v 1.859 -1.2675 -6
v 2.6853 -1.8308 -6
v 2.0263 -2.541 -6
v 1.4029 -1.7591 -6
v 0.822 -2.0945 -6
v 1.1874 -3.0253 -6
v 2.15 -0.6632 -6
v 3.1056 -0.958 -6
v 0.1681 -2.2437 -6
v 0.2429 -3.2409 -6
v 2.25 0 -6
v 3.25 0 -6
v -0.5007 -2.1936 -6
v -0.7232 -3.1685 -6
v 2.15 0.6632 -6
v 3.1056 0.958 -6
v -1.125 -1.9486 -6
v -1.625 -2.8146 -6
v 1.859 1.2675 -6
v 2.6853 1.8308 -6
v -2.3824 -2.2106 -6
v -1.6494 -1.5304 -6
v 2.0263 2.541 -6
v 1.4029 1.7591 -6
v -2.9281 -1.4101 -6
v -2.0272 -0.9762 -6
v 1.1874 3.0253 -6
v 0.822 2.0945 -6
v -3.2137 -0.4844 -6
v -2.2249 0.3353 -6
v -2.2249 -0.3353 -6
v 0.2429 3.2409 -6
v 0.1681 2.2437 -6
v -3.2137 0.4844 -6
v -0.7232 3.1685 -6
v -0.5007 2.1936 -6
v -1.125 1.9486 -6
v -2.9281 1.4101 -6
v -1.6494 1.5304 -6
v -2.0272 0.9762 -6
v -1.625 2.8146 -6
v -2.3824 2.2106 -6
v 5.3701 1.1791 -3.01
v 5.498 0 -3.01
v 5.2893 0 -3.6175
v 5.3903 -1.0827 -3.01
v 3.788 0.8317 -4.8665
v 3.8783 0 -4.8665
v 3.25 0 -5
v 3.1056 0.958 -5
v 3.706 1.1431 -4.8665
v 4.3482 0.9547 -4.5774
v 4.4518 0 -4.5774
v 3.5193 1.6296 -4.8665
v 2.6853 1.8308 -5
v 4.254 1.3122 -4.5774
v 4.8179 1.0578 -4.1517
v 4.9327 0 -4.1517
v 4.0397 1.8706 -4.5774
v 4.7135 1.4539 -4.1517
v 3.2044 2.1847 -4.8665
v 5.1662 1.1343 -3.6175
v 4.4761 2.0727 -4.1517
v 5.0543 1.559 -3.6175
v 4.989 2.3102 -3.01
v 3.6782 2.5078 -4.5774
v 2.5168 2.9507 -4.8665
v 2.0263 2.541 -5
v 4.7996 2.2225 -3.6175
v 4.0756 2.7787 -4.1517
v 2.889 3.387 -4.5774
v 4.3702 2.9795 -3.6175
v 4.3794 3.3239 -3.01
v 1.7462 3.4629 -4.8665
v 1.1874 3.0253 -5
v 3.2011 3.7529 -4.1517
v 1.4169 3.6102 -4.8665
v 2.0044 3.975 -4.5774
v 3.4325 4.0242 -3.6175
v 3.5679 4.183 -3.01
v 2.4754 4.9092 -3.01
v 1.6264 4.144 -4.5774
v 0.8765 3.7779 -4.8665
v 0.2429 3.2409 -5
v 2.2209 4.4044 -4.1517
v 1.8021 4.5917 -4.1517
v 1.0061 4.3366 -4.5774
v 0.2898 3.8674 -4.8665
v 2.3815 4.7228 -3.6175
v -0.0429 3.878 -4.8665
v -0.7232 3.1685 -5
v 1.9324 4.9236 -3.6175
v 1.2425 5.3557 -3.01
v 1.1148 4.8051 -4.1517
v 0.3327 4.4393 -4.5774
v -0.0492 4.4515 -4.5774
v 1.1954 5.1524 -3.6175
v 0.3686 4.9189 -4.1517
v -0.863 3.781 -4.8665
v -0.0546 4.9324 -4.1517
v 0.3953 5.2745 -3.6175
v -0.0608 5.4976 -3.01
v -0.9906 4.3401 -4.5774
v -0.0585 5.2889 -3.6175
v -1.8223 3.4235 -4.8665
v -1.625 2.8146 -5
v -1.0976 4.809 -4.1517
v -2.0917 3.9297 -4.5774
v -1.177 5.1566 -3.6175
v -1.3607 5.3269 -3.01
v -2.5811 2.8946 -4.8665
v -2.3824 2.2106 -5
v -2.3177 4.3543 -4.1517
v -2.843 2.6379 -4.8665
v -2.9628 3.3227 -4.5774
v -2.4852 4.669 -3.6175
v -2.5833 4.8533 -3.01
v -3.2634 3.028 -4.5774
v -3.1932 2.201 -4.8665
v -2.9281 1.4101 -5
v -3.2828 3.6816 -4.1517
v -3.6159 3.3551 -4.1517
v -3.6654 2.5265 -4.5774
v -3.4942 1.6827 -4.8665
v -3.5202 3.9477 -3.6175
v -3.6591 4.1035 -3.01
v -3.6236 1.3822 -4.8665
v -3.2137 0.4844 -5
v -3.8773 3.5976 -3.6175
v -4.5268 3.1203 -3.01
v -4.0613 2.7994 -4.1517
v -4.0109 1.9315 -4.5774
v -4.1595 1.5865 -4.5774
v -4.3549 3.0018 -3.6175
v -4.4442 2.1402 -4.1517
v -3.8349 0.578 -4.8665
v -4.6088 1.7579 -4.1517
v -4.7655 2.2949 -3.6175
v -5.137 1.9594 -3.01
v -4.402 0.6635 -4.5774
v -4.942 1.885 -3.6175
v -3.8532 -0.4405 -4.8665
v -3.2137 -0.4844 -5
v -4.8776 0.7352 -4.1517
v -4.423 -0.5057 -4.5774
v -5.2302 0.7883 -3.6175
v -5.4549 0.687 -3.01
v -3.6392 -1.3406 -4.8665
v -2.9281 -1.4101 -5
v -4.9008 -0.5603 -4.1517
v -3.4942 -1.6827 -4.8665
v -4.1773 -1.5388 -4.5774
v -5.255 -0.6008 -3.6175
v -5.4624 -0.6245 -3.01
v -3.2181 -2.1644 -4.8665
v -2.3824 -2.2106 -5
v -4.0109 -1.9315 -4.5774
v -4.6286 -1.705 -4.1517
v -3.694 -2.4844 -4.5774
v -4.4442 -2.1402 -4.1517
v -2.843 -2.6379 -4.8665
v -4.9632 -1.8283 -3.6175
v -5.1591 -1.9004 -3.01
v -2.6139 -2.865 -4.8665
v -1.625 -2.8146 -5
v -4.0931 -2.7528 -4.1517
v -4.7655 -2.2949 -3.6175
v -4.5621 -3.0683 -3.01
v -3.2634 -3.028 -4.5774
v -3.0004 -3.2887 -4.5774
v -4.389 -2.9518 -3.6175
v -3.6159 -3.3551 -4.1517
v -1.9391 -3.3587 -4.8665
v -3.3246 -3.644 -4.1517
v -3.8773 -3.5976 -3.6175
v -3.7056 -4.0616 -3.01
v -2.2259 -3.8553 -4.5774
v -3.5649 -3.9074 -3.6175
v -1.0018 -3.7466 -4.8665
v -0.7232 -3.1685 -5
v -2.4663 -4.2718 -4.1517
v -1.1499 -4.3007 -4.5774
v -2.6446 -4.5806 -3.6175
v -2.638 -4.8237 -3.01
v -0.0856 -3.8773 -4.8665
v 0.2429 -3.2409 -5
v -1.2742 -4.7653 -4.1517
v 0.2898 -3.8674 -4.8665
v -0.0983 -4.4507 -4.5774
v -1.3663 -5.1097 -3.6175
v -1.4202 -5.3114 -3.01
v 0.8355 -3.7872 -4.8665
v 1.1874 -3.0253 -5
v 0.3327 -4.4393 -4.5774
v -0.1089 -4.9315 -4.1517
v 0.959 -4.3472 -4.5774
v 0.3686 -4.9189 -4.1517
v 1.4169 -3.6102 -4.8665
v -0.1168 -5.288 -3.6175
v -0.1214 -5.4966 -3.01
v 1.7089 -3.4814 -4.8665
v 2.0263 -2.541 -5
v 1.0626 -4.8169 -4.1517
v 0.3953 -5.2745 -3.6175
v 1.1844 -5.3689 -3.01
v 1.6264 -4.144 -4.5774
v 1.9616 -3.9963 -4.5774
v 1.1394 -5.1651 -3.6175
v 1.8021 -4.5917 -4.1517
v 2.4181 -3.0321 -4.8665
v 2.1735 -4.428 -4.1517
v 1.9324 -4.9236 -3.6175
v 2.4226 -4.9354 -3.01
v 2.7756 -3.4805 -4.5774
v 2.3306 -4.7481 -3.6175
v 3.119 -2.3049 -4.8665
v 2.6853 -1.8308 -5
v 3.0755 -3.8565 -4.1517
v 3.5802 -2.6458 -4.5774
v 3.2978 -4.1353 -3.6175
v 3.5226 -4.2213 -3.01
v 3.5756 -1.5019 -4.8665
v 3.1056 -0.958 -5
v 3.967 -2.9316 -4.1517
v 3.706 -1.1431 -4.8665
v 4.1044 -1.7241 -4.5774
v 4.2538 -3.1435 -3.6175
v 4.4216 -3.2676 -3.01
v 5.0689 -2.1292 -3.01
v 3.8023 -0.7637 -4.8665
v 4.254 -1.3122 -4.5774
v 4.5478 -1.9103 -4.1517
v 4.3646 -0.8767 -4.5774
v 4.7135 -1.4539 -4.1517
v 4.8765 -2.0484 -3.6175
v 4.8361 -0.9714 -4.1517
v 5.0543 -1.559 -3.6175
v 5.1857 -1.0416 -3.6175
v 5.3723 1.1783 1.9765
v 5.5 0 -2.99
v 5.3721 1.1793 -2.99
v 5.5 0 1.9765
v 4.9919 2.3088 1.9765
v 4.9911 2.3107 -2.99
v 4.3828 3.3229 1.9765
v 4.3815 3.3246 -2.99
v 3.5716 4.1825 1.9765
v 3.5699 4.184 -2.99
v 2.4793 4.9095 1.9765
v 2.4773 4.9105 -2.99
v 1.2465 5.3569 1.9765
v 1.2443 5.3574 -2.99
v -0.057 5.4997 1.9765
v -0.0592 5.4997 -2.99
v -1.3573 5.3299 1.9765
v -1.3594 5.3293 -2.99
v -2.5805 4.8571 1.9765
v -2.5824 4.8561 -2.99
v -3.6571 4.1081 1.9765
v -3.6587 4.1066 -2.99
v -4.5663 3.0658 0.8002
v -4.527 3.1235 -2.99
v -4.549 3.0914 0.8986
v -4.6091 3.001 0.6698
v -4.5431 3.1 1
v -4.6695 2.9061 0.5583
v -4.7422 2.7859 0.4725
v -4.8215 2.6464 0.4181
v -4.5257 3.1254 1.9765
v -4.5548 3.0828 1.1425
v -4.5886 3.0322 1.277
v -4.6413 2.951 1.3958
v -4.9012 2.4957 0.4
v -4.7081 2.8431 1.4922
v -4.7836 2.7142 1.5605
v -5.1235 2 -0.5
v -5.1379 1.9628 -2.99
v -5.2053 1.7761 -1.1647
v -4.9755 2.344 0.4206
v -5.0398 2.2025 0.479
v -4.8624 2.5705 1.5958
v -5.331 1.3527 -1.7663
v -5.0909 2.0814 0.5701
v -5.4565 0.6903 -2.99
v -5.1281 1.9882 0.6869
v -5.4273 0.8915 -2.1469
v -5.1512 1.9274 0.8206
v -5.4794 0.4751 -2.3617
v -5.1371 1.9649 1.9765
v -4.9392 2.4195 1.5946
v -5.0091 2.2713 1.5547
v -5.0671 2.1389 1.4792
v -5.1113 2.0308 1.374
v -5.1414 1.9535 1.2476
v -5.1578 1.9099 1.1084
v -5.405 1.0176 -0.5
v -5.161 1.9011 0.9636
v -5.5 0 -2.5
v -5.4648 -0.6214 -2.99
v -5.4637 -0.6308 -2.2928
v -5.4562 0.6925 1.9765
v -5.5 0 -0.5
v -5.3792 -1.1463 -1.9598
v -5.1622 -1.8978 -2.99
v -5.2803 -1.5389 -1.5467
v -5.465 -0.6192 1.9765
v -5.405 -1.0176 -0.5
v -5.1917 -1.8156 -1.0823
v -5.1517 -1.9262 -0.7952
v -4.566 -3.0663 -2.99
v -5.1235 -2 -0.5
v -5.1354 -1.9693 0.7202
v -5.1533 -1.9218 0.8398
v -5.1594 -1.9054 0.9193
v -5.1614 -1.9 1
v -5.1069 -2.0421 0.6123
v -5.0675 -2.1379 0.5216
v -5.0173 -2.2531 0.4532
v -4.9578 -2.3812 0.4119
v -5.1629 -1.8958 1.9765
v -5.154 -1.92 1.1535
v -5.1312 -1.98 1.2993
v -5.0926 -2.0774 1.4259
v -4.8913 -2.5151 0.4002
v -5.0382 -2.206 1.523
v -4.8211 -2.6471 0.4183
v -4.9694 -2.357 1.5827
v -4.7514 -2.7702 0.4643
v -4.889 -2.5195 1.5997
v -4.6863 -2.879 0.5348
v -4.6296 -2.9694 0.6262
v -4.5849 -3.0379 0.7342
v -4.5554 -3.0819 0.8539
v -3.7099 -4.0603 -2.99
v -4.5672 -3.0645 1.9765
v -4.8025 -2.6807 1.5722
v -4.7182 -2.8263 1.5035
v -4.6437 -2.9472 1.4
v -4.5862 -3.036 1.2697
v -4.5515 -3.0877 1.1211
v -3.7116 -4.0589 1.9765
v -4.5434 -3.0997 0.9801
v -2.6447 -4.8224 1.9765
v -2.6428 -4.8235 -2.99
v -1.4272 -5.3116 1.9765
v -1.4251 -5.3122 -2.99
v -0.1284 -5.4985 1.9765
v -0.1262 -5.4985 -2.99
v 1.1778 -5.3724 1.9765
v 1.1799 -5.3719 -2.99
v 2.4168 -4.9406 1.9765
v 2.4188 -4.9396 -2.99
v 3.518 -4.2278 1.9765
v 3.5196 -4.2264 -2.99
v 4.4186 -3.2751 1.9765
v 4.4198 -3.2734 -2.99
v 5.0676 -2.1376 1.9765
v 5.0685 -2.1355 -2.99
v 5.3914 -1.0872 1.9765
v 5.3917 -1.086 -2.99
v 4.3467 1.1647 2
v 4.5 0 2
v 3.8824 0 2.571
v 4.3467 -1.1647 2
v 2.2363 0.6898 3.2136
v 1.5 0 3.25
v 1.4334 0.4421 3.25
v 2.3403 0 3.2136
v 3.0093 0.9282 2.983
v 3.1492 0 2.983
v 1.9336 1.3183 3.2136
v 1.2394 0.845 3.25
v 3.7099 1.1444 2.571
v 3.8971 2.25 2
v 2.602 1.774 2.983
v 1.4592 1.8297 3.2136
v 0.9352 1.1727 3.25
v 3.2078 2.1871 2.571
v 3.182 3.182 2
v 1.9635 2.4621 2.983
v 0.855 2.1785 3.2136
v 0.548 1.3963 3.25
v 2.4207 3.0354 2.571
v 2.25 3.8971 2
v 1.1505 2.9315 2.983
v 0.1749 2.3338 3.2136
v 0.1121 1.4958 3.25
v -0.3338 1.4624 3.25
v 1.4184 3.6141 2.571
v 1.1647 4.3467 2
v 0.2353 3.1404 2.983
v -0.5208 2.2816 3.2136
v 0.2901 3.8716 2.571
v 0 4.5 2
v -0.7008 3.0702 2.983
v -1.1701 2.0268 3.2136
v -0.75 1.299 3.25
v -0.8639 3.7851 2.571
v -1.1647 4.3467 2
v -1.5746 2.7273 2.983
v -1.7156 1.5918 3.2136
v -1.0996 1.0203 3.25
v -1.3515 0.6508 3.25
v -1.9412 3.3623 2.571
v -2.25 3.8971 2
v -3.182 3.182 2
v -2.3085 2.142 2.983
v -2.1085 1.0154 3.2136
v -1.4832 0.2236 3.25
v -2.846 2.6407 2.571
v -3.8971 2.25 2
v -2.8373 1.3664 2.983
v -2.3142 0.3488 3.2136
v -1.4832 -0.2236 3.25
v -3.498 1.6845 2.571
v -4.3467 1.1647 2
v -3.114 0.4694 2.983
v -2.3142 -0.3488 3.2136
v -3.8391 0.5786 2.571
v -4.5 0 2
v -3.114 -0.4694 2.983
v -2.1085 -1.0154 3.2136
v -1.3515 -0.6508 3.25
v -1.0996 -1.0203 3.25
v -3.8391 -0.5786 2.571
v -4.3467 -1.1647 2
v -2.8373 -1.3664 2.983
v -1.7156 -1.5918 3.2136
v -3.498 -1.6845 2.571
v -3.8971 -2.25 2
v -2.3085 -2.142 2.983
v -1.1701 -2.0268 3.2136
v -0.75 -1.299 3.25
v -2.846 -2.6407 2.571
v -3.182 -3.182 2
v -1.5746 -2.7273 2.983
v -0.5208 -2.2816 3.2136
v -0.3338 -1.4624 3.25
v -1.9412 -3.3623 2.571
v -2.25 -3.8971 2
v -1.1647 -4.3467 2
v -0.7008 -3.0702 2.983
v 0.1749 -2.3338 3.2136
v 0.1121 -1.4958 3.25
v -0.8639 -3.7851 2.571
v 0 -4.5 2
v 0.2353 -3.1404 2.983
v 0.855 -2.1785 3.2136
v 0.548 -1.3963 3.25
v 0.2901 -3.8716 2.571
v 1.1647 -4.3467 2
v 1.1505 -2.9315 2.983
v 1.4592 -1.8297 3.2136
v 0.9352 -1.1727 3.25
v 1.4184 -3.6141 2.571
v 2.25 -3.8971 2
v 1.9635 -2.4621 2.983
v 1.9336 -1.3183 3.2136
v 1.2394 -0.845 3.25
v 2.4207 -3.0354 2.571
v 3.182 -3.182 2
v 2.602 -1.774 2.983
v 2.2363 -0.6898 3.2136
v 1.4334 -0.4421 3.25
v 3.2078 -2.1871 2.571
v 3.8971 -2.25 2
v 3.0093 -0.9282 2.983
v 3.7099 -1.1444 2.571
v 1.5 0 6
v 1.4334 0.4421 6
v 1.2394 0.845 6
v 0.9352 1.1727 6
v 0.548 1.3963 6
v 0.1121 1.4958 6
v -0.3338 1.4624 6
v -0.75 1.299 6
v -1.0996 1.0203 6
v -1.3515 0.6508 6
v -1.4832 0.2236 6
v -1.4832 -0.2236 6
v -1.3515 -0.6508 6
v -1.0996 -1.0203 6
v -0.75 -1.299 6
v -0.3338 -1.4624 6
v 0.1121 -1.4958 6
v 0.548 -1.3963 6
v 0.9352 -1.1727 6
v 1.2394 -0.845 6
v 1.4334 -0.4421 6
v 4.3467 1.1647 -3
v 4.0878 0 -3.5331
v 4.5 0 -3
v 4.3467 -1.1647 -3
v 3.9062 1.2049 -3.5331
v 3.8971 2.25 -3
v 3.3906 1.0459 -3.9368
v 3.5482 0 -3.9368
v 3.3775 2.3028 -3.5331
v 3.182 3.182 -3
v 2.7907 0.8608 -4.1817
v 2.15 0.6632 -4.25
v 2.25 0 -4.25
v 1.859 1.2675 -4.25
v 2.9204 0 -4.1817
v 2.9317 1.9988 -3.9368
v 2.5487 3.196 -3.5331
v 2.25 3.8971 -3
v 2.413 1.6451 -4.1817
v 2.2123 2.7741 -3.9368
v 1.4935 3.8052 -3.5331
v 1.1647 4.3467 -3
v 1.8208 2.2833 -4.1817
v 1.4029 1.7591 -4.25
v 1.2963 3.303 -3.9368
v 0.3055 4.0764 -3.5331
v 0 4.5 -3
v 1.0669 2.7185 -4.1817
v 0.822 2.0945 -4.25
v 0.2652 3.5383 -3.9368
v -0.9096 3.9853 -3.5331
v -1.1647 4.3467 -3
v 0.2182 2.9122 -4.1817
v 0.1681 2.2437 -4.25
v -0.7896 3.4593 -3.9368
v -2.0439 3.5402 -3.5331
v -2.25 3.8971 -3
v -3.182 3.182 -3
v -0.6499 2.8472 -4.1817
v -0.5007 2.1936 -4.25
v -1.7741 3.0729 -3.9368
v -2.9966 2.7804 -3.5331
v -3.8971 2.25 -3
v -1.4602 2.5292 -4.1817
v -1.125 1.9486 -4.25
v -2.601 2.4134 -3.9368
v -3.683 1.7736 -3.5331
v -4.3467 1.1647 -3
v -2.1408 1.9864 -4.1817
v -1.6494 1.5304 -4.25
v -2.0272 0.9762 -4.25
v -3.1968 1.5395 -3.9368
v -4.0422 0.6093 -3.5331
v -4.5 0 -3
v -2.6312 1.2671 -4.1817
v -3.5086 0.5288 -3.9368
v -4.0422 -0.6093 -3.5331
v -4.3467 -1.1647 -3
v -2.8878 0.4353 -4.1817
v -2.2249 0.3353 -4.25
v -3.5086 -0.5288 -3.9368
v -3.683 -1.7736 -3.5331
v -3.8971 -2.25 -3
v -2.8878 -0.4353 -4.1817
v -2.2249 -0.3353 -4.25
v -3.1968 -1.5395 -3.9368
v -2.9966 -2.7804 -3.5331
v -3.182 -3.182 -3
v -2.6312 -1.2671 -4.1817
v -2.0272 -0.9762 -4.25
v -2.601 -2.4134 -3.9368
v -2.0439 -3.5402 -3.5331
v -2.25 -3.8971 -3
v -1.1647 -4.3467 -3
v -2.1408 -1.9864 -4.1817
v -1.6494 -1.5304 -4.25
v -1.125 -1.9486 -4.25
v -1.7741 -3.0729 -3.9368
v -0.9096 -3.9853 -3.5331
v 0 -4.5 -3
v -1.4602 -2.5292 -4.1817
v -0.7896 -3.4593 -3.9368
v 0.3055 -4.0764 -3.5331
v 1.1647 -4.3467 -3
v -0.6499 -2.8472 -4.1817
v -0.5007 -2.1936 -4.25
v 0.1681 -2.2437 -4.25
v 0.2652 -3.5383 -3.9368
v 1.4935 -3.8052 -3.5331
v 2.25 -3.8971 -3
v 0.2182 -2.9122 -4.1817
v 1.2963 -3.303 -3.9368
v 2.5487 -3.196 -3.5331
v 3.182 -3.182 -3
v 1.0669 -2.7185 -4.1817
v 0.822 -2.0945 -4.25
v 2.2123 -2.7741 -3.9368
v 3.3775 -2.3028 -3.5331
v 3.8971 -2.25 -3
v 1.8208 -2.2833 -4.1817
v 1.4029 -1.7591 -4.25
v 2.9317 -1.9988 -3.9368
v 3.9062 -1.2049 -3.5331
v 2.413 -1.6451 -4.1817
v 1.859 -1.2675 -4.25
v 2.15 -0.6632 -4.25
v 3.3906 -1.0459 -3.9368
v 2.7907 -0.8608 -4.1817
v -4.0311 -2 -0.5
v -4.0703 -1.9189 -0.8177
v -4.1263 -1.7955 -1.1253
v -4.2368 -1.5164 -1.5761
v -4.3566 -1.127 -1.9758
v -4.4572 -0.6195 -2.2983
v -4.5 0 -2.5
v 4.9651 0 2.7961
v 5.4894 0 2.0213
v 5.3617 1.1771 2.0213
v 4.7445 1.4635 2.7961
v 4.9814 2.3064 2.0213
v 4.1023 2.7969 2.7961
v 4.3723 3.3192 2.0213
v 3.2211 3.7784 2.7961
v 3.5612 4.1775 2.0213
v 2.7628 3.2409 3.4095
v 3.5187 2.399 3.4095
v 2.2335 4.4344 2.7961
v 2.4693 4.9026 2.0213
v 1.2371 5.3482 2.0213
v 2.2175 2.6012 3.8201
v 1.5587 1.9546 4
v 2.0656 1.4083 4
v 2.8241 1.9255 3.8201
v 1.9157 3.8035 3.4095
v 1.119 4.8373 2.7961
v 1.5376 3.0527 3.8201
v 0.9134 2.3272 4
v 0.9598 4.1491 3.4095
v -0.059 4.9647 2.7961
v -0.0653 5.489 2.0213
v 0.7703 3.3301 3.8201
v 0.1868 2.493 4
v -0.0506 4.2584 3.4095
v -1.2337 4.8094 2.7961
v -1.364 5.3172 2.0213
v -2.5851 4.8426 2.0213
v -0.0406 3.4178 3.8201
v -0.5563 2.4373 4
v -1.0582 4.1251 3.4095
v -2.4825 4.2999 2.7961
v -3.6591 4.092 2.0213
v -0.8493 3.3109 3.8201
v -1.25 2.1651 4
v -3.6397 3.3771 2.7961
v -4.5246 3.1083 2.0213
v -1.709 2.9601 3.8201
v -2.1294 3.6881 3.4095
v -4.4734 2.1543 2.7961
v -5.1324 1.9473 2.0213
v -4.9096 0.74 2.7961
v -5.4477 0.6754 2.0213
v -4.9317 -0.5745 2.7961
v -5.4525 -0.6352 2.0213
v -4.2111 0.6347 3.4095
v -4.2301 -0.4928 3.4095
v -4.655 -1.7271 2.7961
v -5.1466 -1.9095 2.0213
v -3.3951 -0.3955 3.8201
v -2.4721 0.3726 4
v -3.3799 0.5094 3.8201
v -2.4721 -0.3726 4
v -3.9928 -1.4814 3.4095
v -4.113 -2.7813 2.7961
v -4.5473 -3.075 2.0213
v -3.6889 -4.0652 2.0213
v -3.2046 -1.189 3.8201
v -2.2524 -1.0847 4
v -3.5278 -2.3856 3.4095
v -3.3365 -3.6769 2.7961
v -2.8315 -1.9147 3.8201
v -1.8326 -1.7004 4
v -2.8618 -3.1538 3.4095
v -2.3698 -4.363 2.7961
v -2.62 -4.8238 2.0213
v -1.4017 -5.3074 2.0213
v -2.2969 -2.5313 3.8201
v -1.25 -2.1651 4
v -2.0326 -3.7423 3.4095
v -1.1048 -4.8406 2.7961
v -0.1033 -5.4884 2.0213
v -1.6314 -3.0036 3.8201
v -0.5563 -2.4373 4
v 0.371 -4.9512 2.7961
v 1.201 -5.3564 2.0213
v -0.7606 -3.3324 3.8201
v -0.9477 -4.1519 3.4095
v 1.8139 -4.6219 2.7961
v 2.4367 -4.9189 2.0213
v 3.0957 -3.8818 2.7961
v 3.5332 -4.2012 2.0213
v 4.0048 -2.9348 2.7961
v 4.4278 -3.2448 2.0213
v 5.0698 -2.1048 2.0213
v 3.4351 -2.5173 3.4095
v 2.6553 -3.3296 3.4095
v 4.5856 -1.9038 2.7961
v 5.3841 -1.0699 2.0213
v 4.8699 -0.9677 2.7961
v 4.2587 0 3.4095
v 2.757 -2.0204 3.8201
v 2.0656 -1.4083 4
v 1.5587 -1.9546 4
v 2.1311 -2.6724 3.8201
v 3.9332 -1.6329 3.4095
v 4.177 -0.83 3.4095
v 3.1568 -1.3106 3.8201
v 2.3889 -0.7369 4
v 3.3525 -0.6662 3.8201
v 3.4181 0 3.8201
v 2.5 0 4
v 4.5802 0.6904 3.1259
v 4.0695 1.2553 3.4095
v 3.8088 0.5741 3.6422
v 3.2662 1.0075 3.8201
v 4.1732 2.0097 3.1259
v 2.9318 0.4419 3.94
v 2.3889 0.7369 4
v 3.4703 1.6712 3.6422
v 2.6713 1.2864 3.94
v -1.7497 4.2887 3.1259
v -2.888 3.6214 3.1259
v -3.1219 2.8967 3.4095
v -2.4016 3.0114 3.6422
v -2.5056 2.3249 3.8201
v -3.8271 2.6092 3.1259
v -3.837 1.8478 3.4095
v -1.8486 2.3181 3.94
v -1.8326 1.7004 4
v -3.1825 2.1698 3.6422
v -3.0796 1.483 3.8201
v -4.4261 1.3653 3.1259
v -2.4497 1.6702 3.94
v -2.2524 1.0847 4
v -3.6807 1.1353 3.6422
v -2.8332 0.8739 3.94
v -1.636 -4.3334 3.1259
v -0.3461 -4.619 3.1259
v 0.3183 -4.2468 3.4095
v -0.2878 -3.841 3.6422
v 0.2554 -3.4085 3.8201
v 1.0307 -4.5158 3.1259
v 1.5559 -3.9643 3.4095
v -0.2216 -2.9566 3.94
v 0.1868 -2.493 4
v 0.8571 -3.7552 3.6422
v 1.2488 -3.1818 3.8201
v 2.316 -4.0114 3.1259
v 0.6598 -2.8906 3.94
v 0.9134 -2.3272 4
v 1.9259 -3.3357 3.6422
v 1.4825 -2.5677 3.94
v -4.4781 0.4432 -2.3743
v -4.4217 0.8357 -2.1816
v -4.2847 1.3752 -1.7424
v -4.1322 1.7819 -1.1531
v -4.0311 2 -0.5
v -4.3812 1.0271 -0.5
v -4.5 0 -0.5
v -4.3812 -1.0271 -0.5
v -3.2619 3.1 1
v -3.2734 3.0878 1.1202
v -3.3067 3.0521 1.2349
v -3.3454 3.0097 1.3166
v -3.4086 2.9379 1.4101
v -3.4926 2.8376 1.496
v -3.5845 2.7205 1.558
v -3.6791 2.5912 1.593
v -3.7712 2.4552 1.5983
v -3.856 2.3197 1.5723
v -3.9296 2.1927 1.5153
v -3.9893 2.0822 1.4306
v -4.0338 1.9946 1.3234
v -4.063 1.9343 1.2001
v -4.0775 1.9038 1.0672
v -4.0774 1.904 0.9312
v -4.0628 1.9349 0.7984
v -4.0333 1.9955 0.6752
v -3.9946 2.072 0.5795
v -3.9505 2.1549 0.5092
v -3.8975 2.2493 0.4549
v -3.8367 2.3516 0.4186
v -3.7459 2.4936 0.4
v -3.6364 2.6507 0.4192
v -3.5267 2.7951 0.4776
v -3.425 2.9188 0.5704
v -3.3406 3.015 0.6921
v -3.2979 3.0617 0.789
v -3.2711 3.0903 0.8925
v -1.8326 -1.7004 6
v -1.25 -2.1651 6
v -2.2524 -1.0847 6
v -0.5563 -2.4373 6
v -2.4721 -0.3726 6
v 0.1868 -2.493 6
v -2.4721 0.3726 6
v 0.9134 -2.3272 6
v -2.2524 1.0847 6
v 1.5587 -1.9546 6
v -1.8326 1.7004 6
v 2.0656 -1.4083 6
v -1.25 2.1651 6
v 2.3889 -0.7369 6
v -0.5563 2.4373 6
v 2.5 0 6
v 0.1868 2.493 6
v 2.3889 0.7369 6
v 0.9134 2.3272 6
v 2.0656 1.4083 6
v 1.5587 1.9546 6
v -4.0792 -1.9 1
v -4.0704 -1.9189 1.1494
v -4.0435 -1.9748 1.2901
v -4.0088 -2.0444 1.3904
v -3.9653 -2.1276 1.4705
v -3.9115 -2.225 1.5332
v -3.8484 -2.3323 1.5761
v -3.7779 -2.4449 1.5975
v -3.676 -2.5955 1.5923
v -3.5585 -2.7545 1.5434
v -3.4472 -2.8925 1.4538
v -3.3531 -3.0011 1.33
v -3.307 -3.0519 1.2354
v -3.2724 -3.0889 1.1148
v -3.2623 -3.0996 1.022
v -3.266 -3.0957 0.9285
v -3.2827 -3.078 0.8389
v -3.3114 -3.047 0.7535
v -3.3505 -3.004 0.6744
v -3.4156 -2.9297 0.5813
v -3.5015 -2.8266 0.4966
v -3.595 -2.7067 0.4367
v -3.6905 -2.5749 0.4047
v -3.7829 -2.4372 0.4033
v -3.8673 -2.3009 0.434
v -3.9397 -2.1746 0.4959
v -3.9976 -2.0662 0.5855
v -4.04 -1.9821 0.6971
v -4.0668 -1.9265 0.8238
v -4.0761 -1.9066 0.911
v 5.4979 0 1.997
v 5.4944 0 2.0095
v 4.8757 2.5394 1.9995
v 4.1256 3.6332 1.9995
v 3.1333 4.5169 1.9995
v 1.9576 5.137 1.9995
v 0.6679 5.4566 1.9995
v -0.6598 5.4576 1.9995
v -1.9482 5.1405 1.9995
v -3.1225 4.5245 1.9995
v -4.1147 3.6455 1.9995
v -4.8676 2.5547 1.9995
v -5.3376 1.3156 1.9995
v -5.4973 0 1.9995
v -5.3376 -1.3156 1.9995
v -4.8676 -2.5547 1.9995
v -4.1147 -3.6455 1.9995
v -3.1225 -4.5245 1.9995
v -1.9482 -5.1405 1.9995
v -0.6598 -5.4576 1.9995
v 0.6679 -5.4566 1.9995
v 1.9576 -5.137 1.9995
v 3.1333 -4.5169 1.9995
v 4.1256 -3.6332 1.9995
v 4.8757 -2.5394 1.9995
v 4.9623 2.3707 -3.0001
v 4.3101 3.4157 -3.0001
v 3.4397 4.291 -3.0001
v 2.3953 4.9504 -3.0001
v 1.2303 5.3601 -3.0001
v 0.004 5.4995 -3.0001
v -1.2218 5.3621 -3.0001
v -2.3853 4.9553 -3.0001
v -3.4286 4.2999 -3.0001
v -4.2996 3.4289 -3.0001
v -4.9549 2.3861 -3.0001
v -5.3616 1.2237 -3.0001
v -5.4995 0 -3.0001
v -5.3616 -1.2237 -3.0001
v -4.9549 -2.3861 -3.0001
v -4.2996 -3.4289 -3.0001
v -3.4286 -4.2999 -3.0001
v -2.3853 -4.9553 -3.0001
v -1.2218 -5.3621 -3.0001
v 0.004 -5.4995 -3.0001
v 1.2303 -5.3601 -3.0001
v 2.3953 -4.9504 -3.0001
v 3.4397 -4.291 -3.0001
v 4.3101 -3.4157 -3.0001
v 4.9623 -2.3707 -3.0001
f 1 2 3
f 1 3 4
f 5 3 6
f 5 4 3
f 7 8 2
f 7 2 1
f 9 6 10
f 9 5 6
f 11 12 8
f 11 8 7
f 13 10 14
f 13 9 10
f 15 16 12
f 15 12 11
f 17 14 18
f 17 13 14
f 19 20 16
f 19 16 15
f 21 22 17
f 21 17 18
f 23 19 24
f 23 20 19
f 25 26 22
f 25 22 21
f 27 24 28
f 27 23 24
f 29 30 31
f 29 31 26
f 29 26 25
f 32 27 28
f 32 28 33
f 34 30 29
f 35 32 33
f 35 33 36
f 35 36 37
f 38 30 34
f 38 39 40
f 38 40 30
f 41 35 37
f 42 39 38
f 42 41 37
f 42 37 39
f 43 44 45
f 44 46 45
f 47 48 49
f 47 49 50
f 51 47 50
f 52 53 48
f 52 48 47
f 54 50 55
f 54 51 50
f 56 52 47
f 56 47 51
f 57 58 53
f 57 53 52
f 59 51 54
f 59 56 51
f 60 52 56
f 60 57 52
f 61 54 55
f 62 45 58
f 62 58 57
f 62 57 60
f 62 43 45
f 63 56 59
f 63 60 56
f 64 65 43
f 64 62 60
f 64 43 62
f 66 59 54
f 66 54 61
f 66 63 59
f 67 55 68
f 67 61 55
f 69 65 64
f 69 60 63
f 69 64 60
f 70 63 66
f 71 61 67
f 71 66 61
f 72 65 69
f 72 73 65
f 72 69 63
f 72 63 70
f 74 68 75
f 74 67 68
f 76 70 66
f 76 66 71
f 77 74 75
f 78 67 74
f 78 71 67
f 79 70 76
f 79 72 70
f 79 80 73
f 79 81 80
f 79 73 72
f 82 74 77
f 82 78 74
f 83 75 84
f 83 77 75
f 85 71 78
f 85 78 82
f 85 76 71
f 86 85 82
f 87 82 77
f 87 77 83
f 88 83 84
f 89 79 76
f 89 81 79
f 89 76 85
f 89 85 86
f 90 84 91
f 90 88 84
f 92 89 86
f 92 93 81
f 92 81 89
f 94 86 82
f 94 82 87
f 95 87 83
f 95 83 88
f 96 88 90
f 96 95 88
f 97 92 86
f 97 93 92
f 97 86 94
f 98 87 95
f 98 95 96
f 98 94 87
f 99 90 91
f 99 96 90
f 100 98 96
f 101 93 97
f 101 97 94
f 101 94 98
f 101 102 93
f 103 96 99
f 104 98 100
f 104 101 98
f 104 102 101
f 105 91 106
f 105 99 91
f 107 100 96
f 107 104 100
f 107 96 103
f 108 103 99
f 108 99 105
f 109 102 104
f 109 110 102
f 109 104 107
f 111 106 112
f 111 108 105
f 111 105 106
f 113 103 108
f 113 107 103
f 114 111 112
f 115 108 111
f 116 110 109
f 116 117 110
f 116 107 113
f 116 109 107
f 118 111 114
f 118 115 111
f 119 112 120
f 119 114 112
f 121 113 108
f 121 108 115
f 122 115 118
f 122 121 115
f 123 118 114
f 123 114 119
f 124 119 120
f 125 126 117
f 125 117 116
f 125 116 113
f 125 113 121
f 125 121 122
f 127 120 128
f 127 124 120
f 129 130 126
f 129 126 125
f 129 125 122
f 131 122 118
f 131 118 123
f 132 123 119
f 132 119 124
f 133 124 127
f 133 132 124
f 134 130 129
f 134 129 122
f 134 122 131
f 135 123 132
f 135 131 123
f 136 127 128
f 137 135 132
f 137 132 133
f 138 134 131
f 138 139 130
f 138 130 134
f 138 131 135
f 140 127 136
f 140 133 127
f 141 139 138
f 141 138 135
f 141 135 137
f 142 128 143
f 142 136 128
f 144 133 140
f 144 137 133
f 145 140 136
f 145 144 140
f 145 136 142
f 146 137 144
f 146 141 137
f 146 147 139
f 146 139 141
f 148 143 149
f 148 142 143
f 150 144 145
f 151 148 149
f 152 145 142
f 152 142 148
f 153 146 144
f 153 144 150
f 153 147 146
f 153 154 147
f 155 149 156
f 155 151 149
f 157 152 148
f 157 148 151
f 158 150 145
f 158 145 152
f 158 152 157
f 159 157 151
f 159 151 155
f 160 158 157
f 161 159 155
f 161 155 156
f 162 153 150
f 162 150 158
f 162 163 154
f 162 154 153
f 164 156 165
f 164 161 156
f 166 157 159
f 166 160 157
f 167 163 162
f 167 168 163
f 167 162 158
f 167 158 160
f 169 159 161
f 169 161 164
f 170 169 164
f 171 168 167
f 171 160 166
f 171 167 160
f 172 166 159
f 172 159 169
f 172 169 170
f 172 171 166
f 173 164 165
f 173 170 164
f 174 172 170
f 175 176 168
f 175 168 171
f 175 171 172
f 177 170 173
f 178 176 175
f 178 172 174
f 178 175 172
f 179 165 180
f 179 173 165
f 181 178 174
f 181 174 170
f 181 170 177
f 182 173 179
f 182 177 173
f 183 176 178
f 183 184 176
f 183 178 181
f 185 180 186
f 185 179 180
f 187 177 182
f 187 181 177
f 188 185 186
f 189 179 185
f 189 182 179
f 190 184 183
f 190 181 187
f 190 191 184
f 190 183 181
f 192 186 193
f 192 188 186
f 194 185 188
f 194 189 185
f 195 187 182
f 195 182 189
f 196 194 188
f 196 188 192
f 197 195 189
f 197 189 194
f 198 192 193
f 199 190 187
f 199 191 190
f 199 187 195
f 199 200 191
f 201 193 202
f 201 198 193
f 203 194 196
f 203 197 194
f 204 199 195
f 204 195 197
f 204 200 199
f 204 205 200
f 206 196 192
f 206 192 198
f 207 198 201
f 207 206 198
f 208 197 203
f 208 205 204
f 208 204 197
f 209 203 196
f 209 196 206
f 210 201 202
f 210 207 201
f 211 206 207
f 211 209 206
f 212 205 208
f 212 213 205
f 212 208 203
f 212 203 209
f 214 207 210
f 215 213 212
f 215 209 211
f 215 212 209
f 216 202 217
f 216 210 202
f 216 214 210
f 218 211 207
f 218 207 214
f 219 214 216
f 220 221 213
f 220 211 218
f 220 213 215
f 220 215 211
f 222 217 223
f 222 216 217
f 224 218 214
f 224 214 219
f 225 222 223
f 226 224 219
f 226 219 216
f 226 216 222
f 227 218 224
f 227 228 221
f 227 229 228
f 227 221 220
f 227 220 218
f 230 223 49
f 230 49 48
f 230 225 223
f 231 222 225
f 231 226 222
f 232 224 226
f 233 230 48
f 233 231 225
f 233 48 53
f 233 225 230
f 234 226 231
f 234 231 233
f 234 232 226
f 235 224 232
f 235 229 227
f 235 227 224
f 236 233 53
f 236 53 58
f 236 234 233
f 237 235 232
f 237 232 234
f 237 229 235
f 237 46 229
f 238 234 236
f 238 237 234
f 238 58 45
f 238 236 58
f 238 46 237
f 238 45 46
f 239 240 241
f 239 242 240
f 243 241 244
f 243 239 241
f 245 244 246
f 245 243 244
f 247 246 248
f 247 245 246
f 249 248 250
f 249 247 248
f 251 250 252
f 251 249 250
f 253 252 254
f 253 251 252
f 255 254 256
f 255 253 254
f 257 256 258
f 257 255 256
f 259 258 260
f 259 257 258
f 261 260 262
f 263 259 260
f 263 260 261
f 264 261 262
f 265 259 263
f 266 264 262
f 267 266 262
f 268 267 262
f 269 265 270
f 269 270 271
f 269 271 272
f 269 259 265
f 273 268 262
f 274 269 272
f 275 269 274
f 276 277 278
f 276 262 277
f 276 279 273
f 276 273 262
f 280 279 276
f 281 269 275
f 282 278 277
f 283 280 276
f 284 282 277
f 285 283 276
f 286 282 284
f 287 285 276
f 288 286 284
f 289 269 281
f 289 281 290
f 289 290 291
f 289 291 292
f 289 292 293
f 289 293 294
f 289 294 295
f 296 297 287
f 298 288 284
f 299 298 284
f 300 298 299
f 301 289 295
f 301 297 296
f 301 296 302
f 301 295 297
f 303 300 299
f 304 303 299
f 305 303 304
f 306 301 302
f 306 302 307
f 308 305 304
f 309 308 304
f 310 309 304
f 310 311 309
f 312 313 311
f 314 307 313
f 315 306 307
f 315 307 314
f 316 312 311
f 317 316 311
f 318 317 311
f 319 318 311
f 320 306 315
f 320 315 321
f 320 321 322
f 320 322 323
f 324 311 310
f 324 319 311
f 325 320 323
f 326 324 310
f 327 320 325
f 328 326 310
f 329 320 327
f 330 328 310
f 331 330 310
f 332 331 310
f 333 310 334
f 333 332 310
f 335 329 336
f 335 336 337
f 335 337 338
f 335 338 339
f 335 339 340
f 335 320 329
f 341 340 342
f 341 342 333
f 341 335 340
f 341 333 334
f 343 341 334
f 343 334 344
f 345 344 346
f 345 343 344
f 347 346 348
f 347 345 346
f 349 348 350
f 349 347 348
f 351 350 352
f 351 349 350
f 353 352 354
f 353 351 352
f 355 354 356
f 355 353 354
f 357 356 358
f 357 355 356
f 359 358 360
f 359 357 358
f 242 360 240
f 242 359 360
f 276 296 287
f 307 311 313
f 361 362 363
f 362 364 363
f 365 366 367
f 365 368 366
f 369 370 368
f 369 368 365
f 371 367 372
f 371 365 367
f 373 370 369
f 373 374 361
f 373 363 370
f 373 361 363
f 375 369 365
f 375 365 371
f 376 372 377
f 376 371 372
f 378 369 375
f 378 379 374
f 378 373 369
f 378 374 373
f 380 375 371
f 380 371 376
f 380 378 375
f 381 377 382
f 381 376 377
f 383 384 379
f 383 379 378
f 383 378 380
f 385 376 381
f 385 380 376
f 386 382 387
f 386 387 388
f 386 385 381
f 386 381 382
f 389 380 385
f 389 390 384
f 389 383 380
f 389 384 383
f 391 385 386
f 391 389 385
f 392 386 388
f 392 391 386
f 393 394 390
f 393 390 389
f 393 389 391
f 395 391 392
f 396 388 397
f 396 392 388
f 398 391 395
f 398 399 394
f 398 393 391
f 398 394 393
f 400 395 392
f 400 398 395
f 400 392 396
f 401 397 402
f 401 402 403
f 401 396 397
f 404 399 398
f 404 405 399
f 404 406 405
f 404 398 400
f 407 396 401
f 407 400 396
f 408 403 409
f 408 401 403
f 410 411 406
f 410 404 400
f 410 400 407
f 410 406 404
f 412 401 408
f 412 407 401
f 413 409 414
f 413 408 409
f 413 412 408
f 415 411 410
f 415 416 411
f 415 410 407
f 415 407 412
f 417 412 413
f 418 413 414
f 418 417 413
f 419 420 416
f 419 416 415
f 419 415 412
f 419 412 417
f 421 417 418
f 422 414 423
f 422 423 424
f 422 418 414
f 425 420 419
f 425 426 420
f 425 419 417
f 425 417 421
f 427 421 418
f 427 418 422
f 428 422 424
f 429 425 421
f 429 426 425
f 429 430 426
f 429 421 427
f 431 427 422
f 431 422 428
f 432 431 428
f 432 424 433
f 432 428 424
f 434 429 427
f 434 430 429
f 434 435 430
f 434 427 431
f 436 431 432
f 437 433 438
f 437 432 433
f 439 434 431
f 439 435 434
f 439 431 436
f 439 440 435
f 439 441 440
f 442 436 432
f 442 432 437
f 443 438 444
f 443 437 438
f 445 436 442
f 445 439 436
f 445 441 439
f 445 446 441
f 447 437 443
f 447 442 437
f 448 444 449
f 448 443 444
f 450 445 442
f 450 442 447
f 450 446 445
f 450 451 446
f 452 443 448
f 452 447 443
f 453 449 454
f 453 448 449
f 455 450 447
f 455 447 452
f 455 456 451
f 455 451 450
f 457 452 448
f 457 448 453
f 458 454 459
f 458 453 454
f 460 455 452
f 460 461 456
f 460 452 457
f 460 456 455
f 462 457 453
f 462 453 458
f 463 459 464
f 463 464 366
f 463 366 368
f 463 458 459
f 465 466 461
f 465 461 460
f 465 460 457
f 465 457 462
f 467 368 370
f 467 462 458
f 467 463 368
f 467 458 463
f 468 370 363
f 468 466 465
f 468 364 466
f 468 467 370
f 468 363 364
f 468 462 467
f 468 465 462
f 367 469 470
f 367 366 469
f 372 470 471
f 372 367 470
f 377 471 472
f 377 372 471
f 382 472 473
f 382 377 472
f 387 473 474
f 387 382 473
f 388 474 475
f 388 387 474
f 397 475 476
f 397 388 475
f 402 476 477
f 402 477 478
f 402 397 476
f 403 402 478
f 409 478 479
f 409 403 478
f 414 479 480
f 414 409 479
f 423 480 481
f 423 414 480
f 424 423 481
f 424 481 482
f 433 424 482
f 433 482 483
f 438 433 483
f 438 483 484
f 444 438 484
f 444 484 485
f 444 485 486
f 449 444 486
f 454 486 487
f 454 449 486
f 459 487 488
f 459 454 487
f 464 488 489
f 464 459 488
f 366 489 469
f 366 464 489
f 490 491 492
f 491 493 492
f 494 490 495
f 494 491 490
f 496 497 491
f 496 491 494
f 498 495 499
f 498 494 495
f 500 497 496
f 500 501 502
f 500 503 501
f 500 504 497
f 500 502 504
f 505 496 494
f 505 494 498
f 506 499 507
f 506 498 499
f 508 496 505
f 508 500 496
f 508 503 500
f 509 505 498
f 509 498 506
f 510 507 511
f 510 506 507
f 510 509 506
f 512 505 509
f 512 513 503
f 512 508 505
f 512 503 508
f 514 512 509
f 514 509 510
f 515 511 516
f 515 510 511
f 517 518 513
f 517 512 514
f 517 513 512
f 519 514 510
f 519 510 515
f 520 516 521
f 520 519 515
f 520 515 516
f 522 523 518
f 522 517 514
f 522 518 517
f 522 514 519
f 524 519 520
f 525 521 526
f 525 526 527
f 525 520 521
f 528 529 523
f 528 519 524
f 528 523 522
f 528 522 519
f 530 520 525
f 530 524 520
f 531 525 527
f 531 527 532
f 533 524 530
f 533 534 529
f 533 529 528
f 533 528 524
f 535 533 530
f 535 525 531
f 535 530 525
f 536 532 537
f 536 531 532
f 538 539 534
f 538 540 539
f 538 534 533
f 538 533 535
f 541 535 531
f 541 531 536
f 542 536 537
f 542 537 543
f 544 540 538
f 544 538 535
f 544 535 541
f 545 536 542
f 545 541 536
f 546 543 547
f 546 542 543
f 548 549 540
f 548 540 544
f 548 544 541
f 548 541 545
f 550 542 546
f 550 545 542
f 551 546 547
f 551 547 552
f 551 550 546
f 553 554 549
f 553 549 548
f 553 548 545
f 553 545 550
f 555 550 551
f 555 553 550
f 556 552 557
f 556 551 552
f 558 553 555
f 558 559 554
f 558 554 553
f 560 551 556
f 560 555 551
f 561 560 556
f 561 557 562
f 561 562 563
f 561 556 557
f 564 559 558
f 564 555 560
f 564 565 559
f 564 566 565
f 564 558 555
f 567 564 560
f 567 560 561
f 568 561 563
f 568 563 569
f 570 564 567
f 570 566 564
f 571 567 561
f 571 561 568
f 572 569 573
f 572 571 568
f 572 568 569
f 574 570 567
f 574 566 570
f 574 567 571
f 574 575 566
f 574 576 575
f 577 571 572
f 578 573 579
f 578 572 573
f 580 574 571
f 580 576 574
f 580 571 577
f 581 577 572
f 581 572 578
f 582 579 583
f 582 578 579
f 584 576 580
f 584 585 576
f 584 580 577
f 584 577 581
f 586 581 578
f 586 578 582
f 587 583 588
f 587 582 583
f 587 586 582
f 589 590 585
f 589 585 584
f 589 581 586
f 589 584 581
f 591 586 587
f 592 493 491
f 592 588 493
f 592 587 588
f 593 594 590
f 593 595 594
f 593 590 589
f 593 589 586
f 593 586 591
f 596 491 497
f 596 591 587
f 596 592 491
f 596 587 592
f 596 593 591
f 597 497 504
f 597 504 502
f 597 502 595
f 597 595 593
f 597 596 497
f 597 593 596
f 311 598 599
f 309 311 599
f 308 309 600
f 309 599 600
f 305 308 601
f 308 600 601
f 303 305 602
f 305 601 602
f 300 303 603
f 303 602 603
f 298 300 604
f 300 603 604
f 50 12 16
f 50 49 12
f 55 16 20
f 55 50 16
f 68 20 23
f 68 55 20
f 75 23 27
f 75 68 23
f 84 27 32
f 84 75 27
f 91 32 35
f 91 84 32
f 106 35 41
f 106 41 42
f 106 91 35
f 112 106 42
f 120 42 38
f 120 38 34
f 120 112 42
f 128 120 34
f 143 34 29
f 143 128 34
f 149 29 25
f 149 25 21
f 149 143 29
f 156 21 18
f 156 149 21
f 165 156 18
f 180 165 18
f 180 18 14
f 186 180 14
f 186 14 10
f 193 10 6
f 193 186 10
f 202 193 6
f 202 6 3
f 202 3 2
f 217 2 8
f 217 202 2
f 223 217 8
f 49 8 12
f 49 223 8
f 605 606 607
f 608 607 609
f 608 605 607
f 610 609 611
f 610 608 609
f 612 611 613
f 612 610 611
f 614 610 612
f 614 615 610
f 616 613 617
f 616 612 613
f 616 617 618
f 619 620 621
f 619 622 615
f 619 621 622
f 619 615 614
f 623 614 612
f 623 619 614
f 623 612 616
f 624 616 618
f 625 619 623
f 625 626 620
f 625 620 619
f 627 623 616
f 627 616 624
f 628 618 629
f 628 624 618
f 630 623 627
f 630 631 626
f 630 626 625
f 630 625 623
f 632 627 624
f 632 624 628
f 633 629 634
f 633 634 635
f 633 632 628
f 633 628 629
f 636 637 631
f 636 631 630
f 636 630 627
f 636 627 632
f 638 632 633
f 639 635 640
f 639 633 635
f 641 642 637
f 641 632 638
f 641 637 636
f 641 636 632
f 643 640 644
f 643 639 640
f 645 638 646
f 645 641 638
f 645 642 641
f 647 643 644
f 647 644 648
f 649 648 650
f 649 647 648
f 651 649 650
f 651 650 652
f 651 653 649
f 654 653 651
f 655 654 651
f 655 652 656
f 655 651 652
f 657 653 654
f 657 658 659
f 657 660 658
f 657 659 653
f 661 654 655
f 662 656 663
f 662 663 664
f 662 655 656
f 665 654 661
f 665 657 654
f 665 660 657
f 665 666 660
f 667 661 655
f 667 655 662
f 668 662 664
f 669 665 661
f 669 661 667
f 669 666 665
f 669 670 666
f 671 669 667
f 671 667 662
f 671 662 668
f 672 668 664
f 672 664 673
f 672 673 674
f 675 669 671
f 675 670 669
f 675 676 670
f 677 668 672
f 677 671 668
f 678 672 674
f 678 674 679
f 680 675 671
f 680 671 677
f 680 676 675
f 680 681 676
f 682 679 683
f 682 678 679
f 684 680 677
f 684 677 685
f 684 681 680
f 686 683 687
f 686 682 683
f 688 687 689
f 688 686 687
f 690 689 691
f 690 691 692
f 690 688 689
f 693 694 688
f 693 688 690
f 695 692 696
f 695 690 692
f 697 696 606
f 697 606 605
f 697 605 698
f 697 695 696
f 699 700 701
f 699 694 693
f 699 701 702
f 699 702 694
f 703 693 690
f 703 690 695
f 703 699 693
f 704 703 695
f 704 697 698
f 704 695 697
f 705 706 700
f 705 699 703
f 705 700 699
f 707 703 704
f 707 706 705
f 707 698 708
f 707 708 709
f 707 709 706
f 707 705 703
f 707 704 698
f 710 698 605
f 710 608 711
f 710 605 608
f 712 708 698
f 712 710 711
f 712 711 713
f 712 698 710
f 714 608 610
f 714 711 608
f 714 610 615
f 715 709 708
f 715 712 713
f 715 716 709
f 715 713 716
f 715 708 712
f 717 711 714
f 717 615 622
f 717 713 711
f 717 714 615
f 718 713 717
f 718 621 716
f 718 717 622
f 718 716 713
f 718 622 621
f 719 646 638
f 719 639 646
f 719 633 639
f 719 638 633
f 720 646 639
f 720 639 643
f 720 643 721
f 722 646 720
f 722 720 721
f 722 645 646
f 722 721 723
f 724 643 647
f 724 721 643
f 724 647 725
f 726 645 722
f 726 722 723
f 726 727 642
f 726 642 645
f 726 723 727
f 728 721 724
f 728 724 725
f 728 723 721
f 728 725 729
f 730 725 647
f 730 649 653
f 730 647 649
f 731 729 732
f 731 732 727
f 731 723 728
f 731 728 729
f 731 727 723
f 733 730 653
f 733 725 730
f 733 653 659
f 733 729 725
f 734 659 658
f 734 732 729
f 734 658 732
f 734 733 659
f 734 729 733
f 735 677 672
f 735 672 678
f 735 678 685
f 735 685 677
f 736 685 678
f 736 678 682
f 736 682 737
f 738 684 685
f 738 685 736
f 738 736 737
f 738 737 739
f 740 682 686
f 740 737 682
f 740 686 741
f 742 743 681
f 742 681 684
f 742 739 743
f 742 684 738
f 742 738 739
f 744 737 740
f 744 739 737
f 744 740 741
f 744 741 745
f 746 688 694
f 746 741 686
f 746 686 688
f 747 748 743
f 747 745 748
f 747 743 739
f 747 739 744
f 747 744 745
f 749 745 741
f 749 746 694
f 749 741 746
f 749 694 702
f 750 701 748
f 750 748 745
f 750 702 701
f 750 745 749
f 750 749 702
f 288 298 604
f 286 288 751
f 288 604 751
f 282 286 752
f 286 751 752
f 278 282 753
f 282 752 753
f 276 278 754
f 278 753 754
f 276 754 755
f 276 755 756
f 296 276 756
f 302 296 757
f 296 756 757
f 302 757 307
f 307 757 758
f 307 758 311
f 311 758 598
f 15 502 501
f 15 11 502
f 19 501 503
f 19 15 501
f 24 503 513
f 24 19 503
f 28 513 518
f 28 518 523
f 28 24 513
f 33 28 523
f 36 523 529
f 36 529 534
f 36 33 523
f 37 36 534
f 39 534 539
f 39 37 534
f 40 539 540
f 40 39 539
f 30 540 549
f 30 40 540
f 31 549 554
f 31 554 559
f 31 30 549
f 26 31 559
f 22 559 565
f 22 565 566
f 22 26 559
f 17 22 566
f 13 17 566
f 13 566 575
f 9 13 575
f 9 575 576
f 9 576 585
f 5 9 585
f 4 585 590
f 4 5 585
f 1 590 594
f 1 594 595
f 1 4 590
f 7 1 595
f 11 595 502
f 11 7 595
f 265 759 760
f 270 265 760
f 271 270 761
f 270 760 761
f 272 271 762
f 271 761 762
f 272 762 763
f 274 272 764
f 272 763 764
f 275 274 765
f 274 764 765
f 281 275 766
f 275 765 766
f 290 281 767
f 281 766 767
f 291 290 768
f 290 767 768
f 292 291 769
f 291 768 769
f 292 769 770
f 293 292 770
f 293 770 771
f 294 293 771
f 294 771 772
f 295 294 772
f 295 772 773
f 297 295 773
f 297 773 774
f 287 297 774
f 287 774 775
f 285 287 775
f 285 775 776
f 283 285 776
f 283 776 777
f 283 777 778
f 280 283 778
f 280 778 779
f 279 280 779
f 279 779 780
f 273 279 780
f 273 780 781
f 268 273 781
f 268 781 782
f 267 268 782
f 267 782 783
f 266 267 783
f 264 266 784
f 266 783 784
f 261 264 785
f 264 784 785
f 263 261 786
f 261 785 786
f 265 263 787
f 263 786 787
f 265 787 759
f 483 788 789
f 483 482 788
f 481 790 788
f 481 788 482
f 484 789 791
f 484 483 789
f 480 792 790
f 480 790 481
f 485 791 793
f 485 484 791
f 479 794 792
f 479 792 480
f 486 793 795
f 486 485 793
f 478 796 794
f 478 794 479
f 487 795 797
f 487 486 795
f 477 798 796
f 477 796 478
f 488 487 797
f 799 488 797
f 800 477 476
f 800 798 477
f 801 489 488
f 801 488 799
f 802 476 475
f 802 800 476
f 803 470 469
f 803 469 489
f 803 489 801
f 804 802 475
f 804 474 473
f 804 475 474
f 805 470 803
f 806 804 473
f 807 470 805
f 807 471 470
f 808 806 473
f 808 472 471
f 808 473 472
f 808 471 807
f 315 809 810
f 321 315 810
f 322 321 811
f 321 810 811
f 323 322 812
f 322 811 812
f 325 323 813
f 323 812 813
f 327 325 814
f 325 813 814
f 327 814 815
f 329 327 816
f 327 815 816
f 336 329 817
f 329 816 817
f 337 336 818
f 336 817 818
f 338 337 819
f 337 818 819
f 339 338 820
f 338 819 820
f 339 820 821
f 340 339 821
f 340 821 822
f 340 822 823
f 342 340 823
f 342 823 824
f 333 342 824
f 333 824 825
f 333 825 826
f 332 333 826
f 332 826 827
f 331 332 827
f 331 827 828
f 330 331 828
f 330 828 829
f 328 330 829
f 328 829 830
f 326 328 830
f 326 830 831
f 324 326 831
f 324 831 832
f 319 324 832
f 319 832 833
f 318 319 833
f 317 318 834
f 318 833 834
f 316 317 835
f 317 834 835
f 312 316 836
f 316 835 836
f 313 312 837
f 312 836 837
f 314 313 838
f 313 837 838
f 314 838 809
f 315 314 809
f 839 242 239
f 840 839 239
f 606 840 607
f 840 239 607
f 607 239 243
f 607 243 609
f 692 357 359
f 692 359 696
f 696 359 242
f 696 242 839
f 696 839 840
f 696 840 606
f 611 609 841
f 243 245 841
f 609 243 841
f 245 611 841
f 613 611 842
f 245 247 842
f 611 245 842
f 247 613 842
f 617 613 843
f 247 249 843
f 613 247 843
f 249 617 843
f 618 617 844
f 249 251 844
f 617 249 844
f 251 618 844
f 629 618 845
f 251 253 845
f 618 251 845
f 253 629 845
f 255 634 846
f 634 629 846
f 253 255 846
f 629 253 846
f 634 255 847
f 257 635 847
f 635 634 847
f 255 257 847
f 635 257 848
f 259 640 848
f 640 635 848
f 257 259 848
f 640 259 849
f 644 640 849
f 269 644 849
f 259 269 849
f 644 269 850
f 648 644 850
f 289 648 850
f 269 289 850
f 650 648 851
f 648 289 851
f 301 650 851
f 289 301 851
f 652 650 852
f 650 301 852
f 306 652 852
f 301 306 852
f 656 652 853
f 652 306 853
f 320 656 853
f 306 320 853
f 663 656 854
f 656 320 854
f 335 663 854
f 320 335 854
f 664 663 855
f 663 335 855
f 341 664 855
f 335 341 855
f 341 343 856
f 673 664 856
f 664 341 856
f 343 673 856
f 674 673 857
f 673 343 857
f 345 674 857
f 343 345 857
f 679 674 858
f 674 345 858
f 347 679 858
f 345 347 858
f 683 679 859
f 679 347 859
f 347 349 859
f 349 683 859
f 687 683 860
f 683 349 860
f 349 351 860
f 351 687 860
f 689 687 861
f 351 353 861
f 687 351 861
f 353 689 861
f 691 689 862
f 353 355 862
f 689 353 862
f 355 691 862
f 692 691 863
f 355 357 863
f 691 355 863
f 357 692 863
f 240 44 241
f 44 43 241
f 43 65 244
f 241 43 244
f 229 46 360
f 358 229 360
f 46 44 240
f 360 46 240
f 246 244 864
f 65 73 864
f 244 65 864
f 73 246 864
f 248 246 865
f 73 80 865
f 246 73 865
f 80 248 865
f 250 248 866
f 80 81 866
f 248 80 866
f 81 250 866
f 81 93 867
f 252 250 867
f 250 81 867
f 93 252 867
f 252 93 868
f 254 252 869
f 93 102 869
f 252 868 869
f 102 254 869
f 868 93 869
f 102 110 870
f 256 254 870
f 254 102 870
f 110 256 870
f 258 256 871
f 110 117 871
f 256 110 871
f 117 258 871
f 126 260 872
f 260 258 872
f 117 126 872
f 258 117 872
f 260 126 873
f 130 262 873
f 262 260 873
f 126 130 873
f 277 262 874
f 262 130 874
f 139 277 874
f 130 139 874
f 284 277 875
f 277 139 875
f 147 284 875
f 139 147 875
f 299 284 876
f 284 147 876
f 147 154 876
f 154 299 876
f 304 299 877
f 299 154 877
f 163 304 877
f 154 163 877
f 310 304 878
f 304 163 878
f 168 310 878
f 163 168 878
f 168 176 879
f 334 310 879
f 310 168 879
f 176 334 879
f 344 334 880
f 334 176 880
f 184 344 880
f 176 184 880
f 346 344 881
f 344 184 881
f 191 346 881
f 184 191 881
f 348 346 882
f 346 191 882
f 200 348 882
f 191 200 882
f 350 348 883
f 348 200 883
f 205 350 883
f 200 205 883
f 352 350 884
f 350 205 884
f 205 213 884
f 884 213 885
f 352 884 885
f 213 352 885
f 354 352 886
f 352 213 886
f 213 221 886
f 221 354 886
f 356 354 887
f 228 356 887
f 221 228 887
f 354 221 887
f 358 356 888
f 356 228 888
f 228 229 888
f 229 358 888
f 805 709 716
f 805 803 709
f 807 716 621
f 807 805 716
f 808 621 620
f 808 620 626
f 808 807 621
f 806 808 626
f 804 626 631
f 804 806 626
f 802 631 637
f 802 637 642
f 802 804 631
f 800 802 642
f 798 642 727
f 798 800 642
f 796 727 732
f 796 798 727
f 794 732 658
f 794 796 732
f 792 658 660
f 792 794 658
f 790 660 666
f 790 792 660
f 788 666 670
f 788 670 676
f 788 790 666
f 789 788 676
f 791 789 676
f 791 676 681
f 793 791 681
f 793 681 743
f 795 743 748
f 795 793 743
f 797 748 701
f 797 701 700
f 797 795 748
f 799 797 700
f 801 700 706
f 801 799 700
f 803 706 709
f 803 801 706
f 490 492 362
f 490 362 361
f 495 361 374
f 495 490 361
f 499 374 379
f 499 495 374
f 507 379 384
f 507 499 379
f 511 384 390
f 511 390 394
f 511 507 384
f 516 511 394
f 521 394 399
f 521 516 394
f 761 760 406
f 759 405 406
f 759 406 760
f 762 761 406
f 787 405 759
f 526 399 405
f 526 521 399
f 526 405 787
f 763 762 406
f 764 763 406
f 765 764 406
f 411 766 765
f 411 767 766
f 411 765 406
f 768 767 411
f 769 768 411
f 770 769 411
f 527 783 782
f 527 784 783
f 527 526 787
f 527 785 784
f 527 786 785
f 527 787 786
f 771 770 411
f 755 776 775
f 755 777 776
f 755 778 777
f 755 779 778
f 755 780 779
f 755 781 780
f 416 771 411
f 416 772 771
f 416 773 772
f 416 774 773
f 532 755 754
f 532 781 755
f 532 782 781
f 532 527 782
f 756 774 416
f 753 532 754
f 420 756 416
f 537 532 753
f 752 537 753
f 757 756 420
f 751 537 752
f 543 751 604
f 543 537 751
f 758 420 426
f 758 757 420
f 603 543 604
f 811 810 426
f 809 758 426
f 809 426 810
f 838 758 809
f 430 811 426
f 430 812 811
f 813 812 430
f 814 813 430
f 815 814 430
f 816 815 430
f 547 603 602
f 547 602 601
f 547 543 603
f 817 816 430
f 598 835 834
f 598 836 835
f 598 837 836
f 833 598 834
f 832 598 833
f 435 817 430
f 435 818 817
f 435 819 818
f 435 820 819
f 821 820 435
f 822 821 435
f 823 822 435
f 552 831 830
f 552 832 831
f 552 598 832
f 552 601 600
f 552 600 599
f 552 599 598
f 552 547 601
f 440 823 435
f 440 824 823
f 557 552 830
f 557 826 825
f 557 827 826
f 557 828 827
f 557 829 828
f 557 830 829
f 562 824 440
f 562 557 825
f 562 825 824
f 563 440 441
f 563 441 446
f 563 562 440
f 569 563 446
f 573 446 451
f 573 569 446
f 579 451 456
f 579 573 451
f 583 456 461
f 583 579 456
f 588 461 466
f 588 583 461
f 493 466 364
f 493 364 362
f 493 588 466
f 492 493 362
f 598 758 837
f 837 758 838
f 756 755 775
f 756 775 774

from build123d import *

# Parameters (mm, degrees)
F2_R     = 0.1
F3_R     = 0.6
F4_DEPTH = 25


with BuildPart() as f1:
    # F0 (on Front) → F1 (revolve)
    with BuildSketch(Plane.XZ):
        with BuildLine():
            Line((2.5, 6), (1.5, 6))
            Line((1.5, 6), (1.5, 3.25))
            ThreePointArc((1.5, 3.25), (3.149178, 2.983027), (4.5, 2))
            Line((4.5, 2), (4.5, -3))
            ThreePointArc((4.5, -3), (3.548227, -3.936809), (2.25, -4.25))
            Line((2.25, -4.25), (2.25, -6))
            Line((2.25, -6), (3.25, -6))
            Line((3.25, -6), (3.25, -5))
            ThreePointArc((3.25, -5), (4.70978, -4.376627), (5.5, -3))
            Line((5.5, -3), (5.5, 2))
            ThreePointArc((5.5, 2), (4.268624, 3.402936), (2.5, 4))
            Line((2.5, 4), (2.5, 6))
        make_face()
    revolve(axis=Axis((0, 0, 2), (0, 0, 1)))

    # F2
    f2_edges = [f1.edges().sort_by_distance(p)[0] for p in [
        (-5.5, 0, 2),
        (-5.5, 0, -3),
    ]]
    fillet(f2_edges, radius=F2_R)

    # F3 (on Right) → F4 (cut)
    with BuildSketch(Plane.YZ):
        with Locations((-2.5, 1)):
            Circle(F3_R)
        with Locations((2.5, 1)):
            Circle(F3_R)
        with BuildLine():
            Line((2, -0.5), (0, -0.5))
            Line((0, -0.5), (0, -2.5))
            ThreePointArc((0, -2.5), (1.310029, -1.810029), (2, -0.5))
        make_face()
        with BuildLine():
            Line((0, -2.5), (0, -0.5))
            Line((0, -0.5), (-2, -0.5))
            ThreePointArc((-2, -0.5), (-1.310029, -1.810029), (0, -2.5))
        make_face()
    extrude(amount=-F4_DEPTH, mode=Mode.SUBTRACT)


solid = f1.part
